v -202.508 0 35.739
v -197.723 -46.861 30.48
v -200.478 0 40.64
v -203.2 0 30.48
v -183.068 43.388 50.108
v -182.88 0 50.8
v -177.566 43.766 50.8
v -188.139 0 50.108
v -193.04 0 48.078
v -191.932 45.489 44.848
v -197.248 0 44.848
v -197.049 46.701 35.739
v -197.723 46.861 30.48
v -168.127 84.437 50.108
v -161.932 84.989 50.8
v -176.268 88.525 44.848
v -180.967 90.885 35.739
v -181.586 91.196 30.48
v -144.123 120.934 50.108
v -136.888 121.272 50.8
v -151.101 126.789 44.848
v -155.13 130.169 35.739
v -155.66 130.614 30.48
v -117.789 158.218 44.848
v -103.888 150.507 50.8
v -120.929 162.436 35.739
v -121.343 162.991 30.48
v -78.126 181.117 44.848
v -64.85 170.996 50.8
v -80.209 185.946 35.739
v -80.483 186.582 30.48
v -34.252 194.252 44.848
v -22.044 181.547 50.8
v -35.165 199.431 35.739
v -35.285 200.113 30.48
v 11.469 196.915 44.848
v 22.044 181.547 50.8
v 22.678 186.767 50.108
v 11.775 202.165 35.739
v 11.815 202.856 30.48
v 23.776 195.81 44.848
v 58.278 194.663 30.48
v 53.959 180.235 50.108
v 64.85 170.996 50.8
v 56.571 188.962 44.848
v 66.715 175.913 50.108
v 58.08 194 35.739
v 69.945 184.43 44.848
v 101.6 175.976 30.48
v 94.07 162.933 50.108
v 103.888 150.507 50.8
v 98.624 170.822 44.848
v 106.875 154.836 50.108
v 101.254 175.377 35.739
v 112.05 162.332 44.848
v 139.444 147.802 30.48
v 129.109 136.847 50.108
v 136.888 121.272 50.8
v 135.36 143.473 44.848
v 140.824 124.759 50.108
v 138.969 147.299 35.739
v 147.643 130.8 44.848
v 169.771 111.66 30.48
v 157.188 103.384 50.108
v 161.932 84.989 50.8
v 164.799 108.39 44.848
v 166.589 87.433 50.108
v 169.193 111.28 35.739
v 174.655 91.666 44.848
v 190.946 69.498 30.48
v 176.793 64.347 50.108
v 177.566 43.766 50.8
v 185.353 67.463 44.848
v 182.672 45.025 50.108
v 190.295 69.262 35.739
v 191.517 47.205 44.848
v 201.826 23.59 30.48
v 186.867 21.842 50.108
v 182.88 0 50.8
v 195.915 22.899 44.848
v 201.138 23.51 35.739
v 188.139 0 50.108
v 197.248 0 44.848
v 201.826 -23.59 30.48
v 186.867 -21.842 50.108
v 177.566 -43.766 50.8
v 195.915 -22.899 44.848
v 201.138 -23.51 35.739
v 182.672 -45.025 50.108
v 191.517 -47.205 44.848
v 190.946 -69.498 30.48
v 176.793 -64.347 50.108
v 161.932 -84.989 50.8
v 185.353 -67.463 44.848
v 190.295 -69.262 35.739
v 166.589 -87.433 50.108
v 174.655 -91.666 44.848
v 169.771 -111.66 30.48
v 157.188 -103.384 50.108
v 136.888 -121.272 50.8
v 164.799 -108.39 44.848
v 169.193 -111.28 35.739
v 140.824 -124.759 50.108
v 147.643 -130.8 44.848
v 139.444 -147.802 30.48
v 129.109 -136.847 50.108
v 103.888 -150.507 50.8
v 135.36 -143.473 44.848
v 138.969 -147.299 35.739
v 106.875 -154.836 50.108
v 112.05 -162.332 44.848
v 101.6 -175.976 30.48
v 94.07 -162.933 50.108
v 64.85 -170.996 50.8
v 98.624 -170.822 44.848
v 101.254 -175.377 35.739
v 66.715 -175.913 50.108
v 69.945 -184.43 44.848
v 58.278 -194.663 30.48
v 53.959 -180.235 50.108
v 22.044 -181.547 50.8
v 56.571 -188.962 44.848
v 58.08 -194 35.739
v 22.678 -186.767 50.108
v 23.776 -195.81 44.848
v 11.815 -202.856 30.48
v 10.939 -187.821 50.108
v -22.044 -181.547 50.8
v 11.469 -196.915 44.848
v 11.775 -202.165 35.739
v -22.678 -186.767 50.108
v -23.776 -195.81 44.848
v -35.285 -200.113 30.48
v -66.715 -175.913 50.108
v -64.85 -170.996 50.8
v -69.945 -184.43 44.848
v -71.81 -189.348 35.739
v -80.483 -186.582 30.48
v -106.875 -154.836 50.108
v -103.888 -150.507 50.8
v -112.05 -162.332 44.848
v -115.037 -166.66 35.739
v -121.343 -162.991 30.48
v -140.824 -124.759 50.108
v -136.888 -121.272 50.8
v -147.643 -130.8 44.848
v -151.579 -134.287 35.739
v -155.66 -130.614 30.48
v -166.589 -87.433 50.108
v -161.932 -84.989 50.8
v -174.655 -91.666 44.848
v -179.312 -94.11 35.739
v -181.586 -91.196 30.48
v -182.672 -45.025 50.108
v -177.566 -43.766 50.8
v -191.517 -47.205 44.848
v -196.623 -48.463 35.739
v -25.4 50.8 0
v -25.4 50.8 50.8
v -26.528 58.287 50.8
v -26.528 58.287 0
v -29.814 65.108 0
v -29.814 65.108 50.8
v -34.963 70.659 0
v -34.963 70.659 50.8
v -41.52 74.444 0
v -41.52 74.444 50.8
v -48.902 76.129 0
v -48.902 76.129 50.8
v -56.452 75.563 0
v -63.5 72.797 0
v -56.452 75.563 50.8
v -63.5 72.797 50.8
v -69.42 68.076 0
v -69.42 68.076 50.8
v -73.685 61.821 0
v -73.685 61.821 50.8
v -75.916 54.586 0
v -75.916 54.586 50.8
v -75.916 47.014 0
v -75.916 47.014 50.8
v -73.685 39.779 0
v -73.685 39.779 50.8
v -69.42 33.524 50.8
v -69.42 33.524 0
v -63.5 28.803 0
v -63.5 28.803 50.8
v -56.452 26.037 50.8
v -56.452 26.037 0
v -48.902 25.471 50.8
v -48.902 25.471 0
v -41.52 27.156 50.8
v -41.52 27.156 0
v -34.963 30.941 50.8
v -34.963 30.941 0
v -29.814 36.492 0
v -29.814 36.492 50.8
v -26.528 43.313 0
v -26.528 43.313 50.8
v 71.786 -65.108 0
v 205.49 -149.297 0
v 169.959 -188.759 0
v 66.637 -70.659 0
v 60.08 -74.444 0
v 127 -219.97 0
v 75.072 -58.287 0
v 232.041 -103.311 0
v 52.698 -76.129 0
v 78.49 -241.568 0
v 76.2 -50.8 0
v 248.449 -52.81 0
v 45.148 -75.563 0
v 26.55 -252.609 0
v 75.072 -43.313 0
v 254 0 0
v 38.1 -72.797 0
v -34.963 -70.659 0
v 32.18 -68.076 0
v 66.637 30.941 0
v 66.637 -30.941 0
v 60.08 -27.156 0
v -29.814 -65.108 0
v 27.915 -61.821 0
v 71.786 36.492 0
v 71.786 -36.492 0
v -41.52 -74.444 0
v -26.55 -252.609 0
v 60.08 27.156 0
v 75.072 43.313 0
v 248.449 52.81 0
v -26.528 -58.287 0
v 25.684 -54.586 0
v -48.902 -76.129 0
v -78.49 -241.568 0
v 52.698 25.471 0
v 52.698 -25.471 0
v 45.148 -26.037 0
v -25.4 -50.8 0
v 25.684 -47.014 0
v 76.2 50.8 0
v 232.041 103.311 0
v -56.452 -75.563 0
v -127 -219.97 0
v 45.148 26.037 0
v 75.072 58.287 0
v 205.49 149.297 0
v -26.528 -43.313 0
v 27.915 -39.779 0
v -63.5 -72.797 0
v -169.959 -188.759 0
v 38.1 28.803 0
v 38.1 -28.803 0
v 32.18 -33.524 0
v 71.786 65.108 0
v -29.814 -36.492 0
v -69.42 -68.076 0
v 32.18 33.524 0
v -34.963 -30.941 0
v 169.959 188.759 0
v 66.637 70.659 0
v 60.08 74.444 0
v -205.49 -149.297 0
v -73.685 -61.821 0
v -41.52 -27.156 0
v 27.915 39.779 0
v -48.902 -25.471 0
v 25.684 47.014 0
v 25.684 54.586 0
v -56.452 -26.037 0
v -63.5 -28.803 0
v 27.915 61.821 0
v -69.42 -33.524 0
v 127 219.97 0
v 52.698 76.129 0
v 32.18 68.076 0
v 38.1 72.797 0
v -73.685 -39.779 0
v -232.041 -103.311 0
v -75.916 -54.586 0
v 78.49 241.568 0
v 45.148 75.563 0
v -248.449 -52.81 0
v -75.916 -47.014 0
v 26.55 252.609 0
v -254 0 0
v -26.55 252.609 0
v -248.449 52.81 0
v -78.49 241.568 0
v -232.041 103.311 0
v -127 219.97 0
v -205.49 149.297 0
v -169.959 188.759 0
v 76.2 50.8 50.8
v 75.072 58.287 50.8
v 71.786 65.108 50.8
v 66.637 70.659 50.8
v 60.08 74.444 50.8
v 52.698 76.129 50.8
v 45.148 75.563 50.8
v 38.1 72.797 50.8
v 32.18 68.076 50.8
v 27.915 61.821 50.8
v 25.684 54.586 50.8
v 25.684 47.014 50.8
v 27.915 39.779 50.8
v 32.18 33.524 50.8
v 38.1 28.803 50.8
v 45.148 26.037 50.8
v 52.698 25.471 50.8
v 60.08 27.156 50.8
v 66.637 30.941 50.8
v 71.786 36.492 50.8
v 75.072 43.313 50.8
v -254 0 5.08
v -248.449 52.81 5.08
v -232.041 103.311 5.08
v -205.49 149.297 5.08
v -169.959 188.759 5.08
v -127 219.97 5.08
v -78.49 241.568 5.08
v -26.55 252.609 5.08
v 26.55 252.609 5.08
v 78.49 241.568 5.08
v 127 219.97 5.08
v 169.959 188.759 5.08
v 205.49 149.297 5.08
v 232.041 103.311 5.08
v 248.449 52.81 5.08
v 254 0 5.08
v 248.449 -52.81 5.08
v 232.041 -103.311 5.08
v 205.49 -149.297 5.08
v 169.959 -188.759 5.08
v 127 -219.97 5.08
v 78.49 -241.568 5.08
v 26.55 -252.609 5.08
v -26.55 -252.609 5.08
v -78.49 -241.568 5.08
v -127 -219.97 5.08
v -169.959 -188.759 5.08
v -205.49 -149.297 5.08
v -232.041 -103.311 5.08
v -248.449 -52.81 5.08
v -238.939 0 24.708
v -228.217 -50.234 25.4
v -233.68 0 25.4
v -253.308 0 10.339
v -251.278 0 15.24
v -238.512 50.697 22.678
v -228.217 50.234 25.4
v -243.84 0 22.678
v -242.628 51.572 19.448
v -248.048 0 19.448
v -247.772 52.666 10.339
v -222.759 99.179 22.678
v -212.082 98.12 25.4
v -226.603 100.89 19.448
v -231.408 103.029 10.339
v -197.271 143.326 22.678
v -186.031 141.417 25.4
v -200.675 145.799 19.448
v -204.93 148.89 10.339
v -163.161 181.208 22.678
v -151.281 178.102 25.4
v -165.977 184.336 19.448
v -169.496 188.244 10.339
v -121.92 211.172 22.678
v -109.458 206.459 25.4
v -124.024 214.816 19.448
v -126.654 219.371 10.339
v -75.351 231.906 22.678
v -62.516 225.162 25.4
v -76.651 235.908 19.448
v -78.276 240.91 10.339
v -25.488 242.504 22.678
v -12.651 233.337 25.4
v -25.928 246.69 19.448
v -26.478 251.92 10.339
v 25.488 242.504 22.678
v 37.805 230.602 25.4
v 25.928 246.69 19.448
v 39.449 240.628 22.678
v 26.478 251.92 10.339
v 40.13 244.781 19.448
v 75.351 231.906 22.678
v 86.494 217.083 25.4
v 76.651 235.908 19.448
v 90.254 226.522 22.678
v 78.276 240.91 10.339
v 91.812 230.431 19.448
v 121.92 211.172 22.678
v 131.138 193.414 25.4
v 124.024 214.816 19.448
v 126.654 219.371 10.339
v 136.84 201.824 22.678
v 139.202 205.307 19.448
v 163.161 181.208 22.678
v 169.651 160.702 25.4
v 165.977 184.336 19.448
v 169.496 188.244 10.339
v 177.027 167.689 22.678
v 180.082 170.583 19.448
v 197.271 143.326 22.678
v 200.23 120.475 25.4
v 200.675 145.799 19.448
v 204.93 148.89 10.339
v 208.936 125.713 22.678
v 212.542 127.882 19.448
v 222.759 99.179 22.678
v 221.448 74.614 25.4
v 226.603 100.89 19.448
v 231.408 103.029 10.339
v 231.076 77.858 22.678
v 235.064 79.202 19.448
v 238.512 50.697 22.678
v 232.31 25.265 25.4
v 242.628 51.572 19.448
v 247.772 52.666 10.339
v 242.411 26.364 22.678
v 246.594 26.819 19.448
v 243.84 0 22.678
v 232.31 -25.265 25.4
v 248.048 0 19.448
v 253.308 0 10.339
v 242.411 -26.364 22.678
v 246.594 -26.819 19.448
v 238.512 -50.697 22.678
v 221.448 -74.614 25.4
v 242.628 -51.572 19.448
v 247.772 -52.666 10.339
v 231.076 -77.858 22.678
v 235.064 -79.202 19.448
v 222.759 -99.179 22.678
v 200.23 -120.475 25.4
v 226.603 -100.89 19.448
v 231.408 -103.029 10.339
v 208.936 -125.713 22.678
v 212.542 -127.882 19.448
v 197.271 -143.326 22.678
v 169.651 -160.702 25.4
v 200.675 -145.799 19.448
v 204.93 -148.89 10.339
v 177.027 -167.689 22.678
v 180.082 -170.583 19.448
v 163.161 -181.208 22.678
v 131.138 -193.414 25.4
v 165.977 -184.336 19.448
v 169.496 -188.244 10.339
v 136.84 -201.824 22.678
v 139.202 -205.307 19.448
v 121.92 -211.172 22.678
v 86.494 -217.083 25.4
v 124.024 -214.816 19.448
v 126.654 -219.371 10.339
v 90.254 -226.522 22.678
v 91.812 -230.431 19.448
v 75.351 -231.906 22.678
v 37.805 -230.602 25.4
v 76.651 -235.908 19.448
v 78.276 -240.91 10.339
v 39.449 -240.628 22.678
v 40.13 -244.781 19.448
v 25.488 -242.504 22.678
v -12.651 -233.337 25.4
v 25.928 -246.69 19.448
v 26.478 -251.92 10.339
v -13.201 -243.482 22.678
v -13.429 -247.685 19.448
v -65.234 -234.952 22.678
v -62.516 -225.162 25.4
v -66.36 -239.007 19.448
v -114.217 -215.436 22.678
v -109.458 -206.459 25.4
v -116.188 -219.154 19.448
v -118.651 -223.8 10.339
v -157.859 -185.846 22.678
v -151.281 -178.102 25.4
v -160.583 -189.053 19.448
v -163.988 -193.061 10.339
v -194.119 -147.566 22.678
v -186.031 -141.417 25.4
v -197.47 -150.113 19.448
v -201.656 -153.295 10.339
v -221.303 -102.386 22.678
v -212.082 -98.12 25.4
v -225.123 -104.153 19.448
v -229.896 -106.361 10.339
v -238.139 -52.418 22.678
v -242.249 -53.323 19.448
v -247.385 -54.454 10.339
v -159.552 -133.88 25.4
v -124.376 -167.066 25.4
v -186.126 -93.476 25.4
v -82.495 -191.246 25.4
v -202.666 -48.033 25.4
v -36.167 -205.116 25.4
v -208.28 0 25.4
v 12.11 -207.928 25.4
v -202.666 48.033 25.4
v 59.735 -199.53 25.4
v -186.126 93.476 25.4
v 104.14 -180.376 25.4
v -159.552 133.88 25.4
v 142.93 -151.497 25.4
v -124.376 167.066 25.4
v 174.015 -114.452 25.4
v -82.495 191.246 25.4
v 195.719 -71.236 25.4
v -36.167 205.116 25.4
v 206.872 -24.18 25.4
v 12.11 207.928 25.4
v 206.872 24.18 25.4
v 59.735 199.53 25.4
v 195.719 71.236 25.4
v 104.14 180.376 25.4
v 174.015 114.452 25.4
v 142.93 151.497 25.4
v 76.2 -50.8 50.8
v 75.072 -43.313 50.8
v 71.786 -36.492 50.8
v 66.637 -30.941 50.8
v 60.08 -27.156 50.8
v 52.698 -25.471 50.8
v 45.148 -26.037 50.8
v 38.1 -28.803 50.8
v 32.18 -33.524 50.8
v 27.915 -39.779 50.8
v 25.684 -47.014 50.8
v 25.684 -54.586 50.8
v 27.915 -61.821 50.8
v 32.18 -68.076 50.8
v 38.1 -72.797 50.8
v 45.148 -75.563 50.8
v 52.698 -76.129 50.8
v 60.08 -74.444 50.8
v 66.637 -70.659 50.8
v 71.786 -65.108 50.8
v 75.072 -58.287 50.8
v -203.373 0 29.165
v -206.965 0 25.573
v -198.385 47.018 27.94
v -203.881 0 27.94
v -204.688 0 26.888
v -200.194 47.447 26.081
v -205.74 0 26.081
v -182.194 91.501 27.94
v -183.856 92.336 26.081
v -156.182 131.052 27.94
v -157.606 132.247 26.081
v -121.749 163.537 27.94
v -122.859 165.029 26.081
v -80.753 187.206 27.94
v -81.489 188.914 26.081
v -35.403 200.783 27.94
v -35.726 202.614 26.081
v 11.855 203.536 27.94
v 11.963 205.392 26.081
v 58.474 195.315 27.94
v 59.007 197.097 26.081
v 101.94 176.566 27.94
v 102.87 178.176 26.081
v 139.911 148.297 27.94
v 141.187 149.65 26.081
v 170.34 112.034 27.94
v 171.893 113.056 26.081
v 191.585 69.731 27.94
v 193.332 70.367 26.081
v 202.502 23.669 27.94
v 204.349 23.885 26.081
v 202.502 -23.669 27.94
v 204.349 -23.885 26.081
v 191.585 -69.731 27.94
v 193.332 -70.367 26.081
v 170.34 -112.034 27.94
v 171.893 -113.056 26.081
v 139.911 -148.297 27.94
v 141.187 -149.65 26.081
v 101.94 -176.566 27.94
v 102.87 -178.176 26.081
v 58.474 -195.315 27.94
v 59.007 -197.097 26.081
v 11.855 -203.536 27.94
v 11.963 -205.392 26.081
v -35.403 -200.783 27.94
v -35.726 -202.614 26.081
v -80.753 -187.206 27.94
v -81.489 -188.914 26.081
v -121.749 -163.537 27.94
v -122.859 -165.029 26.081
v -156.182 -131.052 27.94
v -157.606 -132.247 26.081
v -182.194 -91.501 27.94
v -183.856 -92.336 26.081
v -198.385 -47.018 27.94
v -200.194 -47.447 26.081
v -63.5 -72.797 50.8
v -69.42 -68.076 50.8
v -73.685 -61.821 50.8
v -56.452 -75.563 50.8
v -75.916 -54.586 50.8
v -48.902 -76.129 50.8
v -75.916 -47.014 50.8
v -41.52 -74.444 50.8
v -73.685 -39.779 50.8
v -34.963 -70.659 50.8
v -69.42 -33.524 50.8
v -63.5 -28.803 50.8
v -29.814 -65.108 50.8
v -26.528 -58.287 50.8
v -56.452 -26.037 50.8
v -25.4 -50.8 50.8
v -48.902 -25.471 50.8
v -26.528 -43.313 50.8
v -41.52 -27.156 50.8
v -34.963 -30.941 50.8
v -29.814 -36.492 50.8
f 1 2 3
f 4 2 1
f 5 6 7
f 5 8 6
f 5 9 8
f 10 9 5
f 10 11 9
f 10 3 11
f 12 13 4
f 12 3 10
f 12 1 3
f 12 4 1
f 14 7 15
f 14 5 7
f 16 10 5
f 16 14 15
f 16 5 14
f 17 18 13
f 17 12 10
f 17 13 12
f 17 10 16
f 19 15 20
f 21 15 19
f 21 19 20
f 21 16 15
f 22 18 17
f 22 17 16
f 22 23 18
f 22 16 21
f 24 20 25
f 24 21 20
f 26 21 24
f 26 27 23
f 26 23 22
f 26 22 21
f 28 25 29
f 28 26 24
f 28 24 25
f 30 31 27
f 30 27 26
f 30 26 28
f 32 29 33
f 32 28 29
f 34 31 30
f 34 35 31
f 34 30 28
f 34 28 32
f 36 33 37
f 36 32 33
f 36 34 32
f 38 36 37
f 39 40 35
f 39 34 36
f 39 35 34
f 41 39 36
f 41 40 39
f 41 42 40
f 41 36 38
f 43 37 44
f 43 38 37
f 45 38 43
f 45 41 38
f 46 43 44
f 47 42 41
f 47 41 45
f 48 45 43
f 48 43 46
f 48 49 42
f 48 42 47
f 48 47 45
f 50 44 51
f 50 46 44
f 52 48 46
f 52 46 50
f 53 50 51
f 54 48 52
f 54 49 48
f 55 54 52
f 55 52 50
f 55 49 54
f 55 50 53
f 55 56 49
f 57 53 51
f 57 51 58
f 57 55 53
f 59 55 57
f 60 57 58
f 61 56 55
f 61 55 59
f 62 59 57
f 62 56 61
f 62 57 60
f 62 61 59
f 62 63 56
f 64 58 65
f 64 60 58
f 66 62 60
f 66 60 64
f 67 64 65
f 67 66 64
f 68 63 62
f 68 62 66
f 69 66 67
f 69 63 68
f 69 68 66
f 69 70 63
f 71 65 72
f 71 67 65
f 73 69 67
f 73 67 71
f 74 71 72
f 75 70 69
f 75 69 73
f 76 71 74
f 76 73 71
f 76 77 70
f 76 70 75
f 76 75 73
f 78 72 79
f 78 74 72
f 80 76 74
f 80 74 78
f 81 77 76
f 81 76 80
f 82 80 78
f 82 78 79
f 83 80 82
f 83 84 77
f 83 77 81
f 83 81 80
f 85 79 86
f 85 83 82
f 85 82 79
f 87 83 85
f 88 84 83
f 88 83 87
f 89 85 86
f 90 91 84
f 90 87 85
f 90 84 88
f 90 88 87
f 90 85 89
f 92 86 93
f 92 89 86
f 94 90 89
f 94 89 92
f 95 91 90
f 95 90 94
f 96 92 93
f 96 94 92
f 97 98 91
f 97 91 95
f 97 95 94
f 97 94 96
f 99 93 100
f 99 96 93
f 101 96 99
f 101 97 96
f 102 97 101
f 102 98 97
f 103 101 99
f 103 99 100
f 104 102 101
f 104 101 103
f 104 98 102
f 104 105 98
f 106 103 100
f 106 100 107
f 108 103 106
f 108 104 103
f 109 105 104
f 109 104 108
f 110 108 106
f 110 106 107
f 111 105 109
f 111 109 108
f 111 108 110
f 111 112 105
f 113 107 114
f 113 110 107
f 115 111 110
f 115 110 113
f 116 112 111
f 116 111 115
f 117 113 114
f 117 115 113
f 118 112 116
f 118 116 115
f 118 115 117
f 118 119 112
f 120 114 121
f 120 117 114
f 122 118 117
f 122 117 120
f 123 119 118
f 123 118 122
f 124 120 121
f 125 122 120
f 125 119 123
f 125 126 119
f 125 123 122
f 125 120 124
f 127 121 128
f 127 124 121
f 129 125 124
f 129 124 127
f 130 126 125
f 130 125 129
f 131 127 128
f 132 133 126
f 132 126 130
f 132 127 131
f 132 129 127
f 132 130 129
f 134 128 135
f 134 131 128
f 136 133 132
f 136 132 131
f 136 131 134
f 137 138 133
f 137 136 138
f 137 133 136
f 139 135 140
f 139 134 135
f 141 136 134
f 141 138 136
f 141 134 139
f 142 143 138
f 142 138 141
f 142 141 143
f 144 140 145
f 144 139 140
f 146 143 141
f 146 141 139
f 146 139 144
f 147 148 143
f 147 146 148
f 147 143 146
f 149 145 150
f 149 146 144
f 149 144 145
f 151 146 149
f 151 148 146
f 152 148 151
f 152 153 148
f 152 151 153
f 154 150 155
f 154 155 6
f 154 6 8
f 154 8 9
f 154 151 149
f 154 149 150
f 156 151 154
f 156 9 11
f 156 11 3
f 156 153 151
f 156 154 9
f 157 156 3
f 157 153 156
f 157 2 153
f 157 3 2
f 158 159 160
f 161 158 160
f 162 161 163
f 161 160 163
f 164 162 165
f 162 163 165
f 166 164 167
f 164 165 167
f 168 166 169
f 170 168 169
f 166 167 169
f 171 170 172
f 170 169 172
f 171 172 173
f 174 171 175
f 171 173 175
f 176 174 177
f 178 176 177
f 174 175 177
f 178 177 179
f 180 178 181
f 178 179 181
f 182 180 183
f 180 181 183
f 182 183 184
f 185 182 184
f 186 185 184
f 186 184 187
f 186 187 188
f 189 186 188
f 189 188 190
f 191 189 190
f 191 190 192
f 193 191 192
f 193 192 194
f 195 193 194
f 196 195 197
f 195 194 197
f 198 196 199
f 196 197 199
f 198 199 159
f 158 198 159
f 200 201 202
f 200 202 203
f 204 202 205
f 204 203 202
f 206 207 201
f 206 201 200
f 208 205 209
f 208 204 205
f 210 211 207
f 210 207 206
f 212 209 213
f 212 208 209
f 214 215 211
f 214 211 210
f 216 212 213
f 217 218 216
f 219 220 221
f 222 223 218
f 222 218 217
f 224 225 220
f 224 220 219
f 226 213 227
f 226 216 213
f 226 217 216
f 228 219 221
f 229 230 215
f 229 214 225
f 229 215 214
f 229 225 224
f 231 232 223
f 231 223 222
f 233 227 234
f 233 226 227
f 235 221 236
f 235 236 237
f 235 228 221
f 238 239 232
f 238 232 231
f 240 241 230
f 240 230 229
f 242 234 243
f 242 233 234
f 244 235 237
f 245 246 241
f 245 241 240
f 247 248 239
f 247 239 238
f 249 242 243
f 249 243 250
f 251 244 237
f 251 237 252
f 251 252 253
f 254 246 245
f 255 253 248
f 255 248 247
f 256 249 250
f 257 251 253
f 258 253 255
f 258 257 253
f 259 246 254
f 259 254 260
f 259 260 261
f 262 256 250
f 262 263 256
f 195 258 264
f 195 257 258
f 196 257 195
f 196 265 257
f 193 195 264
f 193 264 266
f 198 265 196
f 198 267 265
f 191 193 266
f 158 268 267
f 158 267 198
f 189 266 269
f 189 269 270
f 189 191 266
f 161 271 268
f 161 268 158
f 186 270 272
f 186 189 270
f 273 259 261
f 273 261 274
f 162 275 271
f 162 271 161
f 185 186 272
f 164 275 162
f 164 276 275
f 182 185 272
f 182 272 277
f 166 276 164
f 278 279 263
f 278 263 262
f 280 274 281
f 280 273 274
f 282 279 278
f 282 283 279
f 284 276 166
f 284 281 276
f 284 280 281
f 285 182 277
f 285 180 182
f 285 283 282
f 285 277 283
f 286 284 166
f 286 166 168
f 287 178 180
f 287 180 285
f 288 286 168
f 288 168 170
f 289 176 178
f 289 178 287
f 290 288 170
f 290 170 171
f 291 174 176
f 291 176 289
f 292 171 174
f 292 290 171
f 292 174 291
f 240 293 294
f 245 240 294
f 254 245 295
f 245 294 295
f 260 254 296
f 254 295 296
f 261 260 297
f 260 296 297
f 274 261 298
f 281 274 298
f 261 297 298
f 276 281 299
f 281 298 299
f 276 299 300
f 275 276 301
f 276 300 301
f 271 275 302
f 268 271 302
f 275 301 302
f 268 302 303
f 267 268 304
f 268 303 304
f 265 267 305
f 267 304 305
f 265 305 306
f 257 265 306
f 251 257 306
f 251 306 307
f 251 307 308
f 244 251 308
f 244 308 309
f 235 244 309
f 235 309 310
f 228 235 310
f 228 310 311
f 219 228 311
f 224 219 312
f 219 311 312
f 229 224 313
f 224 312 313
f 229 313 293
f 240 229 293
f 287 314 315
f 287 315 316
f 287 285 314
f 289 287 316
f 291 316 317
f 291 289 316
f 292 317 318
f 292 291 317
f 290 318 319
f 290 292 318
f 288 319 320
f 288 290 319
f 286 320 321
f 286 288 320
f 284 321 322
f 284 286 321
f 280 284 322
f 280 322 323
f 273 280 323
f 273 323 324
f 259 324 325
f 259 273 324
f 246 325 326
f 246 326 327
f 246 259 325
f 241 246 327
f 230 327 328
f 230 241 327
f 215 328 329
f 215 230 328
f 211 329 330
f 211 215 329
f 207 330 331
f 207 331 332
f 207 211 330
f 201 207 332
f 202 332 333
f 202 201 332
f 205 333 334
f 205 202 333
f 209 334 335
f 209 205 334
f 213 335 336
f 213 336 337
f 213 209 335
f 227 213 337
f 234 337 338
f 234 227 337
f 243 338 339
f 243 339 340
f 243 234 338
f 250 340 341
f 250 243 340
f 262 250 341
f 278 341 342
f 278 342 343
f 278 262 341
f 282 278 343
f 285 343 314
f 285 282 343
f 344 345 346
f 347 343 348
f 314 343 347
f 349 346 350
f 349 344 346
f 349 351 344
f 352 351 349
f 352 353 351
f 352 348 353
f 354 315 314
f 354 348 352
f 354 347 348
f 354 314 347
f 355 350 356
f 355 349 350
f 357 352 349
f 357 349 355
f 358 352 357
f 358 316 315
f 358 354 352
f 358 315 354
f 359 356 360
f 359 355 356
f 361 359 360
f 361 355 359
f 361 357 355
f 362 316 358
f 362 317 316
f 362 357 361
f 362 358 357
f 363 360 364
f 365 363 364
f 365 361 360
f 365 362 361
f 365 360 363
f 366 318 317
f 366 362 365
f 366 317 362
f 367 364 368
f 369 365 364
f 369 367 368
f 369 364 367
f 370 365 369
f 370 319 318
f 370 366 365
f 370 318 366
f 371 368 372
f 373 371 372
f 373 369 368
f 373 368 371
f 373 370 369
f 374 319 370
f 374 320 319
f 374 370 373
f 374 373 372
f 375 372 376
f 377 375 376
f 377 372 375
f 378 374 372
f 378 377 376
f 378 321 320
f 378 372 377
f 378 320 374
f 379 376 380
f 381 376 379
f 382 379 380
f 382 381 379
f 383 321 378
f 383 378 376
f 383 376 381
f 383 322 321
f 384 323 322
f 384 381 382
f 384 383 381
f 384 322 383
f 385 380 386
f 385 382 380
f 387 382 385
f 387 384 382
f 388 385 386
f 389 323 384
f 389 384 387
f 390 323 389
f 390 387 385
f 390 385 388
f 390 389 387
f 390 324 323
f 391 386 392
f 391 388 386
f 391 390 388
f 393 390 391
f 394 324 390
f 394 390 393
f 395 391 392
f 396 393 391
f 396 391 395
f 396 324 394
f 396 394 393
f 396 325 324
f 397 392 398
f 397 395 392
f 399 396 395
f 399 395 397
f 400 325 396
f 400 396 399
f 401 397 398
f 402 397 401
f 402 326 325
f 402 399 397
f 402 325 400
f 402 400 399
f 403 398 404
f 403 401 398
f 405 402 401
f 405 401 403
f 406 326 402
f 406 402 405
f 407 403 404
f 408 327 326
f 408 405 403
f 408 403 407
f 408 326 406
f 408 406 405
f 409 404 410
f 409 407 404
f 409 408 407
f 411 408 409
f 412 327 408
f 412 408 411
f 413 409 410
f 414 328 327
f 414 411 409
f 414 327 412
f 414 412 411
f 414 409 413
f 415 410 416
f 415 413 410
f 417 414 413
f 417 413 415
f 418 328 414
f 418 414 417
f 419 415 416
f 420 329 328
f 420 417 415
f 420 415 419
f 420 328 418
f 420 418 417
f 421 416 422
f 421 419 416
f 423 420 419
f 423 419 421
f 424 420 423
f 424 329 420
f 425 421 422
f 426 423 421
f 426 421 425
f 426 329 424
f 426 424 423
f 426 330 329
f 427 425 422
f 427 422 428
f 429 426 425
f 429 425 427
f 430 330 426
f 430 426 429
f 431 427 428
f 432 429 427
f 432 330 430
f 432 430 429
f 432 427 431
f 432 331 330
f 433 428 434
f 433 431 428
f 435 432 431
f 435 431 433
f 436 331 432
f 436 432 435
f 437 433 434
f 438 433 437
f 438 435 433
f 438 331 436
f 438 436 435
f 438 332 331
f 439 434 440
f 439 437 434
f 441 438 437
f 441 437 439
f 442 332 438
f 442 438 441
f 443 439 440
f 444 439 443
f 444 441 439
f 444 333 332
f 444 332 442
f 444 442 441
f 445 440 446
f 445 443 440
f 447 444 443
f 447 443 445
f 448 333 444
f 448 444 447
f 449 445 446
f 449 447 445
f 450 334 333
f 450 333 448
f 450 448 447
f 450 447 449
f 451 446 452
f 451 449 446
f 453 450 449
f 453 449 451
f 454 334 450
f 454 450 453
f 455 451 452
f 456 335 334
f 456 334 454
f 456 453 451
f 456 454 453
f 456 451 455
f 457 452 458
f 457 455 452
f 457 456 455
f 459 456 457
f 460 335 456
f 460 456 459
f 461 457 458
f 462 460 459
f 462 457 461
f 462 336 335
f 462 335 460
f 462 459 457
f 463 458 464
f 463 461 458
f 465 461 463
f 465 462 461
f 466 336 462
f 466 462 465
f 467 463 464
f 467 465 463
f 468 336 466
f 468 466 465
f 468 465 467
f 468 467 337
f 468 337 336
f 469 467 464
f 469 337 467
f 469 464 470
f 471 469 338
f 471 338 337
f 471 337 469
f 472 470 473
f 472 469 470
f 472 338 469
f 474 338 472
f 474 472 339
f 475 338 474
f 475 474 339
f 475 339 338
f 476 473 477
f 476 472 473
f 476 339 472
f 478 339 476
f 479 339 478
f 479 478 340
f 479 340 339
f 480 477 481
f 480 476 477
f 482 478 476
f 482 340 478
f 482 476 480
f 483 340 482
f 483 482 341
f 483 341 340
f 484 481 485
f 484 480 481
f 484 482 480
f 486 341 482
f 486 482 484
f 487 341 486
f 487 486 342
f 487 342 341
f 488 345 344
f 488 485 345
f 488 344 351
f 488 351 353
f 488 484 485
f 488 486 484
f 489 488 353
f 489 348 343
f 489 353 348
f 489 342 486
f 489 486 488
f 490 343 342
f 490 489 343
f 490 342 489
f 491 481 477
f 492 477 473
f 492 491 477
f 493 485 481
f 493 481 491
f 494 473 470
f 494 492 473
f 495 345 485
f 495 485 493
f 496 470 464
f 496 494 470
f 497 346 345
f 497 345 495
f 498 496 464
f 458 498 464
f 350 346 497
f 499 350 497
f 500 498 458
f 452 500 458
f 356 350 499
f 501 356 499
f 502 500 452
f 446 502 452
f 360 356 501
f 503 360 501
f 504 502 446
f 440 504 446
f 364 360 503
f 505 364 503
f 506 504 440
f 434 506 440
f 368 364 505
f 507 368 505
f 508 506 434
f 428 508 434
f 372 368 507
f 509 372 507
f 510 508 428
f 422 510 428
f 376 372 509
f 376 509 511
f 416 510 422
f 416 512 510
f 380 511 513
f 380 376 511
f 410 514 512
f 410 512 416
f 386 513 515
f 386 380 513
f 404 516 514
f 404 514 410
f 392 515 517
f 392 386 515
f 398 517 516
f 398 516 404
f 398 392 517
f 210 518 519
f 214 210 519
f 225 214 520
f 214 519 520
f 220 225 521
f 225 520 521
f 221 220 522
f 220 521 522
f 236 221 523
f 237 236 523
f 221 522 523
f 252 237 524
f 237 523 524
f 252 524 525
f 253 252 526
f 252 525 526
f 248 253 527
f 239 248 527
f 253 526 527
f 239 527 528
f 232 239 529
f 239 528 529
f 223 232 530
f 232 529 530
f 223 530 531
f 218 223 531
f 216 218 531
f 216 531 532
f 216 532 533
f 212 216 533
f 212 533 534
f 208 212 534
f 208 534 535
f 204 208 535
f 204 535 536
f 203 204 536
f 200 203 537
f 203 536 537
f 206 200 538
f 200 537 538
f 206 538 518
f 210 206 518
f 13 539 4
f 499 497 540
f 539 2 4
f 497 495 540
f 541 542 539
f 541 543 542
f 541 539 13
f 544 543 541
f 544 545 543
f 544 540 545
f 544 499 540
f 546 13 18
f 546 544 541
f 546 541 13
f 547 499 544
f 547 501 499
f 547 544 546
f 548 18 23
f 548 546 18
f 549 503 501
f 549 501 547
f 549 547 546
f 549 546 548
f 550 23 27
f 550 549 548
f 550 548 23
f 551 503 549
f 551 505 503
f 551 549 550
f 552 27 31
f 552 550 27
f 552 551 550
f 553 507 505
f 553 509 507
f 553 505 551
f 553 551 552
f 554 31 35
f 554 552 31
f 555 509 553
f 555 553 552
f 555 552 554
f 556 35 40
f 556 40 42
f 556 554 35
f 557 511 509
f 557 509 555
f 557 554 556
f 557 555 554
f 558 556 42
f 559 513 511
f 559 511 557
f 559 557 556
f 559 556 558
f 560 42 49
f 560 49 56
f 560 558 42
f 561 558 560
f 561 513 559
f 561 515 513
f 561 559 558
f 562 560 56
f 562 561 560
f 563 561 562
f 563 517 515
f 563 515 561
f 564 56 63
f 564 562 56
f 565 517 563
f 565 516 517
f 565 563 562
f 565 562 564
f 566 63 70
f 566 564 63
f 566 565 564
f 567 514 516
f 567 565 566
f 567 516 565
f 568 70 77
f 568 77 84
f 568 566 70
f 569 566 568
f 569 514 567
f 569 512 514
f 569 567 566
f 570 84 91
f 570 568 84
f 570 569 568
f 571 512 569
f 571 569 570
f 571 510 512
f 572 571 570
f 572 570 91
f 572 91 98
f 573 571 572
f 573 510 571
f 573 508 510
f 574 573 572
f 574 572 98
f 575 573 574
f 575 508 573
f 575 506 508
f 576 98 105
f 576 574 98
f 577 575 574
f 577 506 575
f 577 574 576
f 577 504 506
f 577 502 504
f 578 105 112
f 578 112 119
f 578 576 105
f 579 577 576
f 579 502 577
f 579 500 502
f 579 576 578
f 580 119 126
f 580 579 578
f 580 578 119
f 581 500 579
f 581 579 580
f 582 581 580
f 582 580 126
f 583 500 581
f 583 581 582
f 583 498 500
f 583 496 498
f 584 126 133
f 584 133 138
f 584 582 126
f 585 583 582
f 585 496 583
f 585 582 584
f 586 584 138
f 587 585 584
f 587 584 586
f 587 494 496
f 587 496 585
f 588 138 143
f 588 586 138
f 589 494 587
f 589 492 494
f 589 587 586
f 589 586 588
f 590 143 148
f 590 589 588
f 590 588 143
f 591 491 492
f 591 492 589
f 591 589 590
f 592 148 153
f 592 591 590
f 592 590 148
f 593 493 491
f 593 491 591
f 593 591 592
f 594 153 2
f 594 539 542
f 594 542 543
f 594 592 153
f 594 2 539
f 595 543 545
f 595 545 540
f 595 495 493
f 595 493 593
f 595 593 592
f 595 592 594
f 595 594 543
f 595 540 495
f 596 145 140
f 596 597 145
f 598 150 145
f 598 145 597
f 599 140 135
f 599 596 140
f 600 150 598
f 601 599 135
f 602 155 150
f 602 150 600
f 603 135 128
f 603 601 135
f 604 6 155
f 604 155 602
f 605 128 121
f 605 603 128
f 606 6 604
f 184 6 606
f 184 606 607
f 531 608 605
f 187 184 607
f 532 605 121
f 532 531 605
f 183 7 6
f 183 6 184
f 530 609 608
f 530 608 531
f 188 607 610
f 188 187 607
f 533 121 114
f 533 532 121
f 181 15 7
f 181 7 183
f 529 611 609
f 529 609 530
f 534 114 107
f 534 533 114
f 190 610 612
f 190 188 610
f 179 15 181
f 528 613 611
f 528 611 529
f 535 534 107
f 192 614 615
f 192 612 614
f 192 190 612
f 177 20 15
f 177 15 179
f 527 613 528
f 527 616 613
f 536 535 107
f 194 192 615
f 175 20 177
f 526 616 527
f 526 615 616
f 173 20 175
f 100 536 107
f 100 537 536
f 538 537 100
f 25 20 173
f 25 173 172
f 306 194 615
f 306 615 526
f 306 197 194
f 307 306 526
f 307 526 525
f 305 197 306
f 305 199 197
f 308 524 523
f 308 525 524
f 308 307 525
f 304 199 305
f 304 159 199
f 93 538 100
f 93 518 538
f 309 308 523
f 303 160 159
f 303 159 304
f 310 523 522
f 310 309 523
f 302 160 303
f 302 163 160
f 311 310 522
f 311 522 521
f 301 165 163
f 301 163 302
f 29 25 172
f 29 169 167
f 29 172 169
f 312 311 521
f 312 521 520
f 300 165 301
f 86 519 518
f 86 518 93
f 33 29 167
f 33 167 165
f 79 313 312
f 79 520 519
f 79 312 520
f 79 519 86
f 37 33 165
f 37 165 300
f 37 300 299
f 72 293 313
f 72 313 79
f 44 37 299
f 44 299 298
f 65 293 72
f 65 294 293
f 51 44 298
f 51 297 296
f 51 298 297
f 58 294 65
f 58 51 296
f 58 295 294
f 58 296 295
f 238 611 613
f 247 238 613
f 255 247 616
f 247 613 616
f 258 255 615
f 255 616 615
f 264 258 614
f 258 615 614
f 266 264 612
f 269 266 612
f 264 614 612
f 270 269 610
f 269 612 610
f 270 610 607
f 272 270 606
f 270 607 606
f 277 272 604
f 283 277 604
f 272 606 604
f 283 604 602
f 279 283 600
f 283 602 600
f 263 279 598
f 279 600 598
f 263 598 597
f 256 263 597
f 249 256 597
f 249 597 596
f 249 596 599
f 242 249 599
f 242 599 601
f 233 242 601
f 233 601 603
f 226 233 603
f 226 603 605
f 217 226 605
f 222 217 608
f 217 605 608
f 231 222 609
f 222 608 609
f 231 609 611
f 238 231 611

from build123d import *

# Parameters (mm, degrees)
F2_R     = 25.4
F3_DEPTH = 50.8


with BuildPart() as f1:
    # F0 (on Front) → F1 (revolve)
    with BuildSketch(Plane.XZ):
        with BuildLine():
            Line((-254, 0), (0, 0))
            Line((0, 0), (0, 50.8))
            Line((0, 50.8), (-182.88, 50.8))
            ThreePointArc((-182.88, 50.8), (-197.24841, 44.84841), (-203.2, 30.48))
            ThreePointArc((-203.2, 30.48), (-204.687898, 26.887898), (-208.28, 25.4))
            Line((-208.28, 25.4), (-233.68, 25.4))
            ThreePointArc((-233.68, 25.4), (-248.04841, 19.44841), (-254, 5.08))
            Line((-254, 5.08), (-254, 0))
        make_face()
    revolve(axis=Axis((0, 0, 25.4), (0, 0, -1)))

    # F2 (on face) → F3 (cut)
    with BuildSketch(Plane.XY.offset(50.8)):
        with Locations((-50.8, 50.8)):
            Circle(F2_R)
        with Locations((50.8, 50.8)):
            Circle(F2_R)
        with Locations((-50.8, -50.8)):
            Circle(F2_R)
        with Locations((50.8, -50.8)):
            Circle(F2_R)
    extrude(amount=-F3_DEPTH, mode=Mode.SUBTRACT)


solid = f1.part
